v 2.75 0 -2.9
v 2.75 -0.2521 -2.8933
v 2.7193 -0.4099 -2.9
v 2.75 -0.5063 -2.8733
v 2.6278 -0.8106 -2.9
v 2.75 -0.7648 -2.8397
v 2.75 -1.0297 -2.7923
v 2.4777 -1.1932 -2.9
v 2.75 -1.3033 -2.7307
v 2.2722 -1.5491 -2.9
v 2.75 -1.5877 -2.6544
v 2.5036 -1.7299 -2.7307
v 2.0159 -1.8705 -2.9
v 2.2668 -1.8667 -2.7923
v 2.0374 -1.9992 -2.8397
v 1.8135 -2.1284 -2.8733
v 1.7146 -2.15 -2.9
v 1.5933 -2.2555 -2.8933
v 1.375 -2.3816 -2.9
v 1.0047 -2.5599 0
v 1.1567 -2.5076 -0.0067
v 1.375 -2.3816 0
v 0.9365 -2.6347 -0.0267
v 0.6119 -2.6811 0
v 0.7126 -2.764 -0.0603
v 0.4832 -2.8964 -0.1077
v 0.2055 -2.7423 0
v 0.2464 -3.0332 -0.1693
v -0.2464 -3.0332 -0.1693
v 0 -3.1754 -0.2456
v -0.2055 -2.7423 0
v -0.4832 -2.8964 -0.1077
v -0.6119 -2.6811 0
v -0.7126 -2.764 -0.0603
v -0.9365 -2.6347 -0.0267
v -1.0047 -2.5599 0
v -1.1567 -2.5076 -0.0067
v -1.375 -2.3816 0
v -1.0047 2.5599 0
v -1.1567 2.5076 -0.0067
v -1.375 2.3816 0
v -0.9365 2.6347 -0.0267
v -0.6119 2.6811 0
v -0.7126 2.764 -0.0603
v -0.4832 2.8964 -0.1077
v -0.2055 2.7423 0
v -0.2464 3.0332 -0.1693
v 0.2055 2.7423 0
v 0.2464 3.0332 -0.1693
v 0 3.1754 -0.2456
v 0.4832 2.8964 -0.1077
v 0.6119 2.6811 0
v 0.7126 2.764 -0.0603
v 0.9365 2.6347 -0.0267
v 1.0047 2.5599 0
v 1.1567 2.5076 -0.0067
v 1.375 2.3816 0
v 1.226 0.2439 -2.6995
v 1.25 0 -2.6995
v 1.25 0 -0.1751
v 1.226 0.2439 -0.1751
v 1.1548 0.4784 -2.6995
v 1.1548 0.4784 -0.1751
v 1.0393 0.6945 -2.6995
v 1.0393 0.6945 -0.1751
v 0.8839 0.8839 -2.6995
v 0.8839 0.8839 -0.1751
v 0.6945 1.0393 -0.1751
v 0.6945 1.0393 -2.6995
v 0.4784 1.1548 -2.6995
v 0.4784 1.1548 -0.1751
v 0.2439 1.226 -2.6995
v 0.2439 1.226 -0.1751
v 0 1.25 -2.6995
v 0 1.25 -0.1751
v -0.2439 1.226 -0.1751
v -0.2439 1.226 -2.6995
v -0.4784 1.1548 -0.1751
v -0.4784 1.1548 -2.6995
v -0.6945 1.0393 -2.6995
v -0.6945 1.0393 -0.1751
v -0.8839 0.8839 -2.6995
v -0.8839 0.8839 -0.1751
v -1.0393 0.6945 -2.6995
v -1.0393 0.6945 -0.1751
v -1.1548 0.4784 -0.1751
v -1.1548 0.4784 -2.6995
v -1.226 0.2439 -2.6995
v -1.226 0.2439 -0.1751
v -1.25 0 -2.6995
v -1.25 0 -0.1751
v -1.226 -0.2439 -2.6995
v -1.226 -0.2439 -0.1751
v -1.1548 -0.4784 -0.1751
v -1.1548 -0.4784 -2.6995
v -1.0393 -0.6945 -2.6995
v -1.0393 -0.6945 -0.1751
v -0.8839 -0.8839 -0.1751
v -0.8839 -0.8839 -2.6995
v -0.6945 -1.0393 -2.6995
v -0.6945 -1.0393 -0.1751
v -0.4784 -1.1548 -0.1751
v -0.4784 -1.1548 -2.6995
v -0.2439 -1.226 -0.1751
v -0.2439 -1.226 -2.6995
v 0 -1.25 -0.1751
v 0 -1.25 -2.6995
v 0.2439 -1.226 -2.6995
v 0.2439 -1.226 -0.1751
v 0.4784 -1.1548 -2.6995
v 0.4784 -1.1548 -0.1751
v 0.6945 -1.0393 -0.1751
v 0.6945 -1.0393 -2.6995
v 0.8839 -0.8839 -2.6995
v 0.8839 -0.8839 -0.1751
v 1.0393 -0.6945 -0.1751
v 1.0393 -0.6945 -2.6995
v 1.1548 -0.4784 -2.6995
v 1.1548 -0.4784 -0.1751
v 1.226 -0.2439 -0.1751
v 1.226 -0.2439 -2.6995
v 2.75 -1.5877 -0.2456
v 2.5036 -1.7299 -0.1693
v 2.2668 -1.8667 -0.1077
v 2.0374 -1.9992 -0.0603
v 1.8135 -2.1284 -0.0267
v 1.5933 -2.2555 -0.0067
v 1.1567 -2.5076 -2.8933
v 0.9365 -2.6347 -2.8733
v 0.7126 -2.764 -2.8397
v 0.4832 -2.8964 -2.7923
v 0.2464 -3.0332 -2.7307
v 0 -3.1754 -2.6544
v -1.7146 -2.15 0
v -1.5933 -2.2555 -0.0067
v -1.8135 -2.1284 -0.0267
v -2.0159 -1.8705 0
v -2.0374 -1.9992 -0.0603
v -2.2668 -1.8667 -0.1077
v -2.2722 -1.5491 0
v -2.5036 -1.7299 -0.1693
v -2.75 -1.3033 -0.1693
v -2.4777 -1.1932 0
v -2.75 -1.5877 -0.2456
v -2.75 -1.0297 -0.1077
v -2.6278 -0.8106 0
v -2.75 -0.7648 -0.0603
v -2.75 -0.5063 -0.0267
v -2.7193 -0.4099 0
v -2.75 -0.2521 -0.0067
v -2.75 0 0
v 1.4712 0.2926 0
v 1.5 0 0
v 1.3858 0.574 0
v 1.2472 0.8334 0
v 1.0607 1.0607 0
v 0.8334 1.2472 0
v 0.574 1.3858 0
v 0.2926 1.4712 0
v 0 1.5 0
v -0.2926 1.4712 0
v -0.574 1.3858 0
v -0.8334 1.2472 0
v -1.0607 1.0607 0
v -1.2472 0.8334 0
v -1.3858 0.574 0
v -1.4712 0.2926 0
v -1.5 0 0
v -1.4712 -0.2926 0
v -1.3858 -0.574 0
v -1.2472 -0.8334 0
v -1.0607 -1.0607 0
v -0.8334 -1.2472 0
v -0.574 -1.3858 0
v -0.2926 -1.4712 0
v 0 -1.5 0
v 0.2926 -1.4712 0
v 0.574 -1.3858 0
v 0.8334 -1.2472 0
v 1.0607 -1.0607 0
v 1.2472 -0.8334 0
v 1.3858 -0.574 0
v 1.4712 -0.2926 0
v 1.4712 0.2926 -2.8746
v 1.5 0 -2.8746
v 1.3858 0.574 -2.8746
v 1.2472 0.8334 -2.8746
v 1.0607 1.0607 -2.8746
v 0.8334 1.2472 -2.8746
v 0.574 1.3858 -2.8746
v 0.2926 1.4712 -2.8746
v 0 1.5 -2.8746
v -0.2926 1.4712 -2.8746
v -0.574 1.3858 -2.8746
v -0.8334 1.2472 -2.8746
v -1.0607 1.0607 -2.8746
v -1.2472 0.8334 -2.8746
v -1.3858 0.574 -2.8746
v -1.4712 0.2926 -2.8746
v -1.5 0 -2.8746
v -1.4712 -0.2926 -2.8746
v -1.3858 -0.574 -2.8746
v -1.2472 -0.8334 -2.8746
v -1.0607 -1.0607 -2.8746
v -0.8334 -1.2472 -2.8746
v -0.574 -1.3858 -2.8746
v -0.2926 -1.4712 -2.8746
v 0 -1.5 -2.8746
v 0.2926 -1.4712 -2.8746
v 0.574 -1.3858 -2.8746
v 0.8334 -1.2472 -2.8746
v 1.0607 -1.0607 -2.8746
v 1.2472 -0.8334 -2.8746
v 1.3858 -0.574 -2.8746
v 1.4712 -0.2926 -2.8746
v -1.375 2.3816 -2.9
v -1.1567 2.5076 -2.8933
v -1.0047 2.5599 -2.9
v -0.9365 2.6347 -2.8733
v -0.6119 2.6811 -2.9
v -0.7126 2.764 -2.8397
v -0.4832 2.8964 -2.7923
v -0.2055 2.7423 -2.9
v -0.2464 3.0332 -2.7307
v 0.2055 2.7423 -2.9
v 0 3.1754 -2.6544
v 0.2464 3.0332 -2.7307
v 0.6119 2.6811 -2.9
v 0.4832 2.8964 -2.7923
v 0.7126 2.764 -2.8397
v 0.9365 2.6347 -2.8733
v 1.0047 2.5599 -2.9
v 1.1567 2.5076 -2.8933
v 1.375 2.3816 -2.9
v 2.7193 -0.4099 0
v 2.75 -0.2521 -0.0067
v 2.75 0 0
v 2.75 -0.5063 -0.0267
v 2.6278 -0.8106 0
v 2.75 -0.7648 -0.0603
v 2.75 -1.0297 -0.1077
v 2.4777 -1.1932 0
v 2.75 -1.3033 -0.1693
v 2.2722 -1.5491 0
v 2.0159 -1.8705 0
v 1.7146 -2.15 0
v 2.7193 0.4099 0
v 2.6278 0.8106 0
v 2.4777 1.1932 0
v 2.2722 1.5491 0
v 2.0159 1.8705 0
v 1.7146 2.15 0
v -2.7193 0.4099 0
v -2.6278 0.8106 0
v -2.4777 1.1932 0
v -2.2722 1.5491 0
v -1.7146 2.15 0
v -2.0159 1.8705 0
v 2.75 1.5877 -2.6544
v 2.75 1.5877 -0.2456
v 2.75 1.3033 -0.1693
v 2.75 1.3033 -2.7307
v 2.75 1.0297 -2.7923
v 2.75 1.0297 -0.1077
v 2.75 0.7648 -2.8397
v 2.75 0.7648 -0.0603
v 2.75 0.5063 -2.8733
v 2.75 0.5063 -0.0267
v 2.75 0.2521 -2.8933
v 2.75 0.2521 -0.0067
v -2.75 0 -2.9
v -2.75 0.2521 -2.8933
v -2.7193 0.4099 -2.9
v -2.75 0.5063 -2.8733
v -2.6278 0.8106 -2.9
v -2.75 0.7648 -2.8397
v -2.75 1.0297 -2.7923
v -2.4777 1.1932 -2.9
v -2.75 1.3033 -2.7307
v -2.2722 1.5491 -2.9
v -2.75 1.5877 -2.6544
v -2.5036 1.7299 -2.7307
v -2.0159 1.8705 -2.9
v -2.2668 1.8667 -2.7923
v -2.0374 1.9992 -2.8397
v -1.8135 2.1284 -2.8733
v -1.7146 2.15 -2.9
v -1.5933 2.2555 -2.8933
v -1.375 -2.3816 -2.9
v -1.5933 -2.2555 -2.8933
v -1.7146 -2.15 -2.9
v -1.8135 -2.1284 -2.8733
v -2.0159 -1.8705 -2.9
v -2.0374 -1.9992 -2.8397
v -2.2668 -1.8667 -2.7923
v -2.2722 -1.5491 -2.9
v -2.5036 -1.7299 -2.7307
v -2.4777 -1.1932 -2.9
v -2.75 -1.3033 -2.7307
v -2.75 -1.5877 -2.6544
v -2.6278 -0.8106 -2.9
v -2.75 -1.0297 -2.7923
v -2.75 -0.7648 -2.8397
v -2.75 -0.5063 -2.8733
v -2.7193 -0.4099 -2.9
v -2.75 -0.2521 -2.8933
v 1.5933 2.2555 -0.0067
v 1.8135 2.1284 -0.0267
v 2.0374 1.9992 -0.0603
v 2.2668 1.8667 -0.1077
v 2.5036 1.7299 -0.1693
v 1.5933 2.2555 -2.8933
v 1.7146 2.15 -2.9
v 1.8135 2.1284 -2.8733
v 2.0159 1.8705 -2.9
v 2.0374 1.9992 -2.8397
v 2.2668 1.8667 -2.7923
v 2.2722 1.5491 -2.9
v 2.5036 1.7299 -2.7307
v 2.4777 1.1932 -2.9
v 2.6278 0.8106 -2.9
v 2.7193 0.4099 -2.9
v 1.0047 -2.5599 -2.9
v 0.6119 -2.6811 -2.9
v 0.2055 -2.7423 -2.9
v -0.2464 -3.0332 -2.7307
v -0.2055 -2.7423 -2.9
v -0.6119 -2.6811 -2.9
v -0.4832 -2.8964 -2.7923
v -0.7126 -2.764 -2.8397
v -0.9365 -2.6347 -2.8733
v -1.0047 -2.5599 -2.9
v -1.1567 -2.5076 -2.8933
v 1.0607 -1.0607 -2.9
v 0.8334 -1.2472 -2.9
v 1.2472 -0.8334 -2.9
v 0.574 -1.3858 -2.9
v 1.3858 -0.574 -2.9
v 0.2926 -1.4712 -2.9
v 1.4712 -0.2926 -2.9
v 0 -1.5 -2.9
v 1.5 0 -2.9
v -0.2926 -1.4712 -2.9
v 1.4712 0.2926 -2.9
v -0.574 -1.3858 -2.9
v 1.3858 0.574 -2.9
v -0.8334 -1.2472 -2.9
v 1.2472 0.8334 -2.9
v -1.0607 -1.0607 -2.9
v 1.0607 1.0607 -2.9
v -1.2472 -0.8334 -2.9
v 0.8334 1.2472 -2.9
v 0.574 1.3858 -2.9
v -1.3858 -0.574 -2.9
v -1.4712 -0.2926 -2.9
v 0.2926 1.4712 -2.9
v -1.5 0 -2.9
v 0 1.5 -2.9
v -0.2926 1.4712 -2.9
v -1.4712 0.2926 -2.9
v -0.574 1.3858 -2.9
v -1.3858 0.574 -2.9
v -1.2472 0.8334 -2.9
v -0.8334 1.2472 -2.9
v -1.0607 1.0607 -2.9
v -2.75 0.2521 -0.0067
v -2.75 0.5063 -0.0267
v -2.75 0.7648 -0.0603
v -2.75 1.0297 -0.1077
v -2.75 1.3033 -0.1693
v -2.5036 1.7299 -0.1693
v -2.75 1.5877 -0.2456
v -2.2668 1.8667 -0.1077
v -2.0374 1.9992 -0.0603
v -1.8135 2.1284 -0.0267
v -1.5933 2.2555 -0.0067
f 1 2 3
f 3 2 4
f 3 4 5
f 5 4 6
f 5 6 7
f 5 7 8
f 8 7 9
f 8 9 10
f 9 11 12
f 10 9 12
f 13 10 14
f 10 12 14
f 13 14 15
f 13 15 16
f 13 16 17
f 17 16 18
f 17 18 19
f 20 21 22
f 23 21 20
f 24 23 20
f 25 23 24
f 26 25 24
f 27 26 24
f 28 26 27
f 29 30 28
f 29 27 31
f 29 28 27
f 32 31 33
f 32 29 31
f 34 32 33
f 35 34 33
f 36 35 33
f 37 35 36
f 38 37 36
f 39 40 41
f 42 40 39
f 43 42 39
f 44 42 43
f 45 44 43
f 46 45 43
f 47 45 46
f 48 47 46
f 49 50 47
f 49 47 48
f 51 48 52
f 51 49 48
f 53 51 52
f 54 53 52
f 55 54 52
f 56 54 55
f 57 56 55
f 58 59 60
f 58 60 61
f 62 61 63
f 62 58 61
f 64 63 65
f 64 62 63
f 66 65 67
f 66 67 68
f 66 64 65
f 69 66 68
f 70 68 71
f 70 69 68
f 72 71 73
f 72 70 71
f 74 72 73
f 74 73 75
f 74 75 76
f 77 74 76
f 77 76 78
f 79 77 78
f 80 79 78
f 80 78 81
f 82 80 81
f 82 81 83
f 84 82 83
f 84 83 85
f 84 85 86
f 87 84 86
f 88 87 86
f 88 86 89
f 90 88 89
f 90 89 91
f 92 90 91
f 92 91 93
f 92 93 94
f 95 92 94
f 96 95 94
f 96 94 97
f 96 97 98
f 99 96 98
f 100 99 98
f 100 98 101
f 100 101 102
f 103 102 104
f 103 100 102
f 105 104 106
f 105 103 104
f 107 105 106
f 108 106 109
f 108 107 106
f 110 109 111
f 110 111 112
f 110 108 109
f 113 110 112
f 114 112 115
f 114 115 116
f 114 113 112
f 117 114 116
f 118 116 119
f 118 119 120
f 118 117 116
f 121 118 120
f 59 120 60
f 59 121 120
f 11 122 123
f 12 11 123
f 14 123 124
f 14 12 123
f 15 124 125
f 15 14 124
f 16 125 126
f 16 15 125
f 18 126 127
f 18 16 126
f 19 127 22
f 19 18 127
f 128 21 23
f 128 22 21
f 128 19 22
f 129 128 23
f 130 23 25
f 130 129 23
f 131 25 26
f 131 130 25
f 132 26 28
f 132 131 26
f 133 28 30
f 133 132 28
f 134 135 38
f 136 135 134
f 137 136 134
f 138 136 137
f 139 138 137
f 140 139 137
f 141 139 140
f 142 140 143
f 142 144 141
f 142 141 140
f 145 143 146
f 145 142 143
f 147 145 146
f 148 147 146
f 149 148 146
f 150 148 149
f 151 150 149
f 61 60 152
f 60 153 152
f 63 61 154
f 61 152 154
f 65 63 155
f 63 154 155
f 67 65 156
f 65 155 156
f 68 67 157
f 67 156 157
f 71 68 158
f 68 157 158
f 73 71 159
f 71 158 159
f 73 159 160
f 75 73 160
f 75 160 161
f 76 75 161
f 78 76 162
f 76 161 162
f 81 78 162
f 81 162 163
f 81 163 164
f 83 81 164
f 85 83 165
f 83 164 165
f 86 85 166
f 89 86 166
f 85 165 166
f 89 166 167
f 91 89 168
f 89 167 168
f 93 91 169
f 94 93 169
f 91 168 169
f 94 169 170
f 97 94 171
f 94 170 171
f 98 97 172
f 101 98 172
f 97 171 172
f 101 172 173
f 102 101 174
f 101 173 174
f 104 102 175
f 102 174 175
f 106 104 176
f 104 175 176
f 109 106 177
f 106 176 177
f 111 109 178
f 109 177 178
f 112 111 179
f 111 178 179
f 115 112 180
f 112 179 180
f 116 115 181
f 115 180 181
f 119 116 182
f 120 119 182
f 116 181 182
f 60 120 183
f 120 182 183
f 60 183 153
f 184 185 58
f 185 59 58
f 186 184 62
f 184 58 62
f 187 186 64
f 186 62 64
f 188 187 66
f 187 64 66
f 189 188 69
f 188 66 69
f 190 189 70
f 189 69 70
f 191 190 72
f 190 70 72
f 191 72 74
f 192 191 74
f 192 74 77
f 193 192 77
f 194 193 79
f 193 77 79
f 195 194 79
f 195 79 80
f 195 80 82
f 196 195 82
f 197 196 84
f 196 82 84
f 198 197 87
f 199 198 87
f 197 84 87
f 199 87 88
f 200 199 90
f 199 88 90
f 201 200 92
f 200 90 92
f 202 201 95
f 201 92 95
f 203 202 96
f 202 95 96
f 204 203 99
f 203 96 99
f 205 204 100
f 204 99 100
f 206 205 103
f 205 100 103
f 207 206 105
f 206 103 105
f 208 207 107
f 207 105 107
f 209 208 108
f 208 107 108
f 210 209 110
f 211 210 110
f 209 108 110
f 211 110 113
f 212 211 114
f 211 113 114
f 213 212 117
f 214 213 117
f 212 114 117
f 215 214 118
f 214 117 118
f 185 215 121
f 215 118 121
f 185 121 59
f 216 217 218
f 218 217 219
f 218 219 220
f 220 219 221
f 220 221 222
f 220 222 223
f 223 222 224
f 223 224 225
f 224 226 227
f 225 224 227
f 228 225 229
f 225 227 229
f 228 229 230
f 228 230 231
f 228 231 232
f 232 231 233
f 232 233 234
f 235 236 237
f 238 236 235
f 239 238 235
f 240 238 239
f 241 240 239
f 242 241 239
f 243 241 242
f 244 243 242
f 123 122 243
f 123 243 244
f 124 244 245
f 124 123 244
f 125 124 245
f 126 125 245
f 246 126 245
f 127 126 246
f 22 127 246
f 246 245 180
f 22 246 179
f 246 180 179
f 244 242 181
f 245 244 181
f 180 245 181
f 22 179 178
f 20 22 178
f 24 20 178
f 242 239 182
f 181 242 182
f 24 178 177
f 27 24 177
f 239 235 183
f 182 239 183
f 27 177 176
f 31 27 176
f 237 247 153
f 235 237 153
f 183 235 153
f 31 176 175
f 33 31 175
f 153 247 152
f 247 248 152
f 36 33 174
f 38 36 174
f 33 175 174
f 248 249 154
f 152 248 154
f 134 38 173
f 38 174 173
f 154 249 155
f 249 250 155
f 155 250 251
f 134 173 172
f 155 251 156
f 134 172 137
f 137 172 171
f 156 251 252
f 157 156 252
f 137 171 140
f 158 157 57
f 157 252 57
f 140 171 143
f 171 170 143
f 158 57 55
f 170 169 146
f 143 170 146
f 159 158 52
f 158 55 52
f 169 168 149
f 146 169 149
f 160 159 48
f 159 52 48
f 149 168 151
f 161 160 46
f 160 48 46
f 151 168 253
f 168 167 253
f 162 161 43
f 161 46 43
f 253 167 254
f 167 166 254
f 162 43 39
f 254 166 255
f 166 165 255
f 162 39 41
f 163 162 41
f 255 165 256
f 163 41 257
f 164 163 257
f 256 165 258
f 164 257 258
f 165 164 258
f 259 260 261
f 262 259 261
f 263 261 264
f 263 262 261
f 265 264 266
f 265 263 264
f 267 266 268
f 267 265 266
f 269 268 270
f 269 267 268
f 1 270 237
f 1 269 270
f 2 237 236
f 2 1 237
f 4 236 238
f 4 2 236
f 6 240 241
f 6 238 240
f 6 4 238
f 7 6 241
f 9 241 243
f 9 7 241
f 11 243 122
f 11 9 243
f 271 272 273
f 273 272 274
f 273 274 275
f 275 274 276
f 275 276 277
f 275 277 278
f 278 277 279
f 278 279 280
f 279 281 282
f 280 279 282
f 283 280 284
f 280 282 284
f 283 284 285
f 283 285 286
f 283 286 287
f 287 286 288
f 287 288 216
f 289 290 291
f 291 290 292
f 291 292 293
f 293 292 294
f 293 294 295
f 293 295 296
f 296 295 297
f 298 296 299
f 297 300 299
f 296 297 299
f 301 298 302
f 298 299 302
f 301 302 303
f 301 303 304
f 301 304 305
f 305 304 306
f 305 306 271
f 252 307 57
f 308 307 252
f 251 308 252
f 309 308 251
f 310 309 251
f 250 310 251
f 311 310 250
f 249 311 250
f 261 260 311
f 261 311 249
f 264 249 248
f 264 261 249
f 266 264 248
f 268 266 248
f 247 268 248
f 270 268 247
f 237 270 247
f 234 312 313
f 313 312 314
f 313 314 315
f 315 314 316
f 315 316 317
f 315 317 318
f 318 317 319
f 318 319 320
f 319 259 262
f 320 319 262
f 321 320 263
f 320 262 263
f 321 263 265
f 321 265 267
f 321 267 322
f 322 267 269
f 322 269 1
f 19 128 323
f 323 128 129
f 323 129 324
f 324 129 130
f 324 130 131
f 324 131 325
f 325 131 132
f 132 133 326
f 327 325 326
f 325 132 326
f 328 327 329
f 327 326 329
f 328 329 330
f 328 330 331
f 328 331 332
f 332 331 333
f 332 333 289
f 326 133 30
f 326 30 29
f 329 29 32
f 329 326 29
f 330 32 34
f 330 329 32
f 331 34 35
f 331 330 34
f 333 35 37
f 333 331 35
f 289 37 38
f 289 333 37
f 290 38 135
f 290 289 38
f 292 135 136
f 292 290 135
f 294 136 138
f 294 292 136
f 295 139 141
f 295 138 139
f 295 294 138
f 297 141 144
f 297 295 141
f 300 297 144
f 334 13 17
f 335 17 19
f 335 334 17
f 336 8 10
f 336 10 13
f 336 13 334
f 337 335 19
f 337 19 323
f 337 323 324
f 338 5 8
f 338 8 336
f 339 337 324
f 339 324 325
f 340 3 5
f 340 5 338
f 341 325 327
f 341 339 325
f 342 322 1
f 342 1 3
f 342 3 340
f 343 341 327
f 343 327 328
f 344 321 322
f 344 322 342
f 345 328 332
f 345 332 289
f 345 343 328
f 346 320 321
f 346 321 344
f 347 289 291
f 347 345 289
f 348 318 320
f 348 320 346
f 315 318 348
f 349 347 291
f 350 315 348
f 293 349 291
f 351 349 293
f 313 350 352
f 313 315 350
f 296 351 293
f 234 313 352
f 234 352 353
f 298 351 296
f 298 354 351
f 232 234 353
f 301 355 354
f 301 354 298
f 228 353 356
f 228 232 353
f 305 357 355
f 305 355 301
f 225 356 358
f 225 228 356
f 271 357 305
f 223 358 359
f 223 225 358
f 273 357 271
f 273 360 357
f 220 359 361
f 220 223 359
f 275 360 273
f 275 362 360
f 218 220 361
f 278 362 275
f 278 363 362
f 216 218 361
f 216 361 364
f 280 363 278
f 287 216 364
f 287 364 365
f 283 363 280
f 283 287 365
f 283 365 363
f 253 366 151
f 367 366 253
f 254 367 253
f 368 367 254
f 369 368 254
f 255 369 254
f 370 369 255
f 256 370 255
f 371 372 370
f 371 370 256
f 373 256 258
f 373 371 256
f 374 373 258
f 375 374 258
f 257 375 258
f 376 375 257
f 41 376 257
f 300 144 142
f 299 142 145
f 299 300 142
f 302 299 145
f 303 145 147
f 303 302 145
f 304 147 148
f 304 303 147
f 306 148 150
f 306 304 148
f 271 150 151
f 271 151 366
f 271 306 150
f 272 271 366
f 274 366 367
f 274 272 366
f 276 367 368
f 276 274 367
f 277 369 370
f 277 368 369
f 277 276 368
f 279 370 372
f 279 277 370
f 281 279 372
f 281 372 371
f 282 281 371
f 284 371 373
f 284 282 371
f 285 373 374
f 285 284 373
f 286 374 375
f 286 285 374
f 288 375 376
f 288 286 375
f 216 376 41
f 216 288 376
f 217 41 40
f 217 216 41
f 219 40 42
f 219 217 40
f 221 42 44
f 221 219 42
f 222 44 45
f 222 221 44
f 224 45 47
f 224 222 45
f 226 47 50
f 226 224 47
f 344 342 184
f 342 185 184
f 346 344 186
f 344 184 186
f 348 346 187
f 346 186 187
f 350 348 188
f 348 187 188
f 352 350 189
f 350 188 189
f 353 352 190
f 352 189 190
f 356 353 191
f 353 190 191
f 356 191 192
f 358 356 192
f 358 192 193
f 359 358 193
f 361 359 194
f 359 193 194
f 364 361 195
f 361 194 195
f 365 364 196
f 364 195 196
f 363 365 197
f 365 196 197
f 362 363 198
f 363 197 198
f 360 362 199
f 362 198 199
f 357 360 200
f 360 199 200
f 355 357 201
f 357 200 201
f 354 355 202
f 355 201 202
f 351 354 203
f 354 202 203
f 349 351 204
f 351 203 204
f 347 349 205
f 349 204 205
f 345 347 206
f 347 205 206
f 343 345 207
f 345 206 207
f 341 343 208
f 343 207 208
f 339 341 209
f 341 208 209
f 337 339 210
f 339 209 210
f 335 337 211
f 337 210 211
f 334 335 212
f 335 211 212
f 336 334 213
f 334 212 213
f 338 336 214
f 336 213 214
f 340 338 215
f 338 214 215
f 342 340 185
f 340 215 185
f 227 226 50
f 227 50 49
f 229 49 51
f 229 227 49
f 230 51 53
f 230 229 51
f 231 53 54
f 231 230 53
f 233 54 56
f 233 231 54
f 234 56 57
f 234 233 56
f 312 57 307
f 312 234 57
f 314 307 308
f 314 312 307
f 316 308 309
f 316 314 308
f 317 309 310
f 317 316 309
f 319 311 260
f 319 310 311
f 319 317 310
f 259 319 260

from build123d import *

# Parameters (mm, degrees)
BASENUT_START = -2.9
BASENUTSKE_R  = 1.25
BASENUT_DEPTH = 2.9


# Read off the part's stored shape, not the designer's step: ThreadSchematic
with BuildPart() as part:
    # BaseNutSke → BaseNut (new body)
    with BuildSketch(Plane.XY.offset(BASENUT_START)):
        Polygon((2.75, 1.58771324), (2.75, -1.58771324), (0, -3.175426481), (-2.75, -1.58771324), (-2.75, 1.58771324), (0, 3.175426481), align=None)
        Circle(BASENUTSKE_R, mode=Mode.SUBTRACT)
    extrude(amount=BASENUT_DEPTH)

    # Sketch5 (on Front Plane) → EndChamfer (revolve, cut)
    with BuildSketch(Plane.XY):
        Polygon((2.8746, 1.5), (2.682042927, 1.225), (2.9254, 1.225), (2.9254, 1.5), align=None)
    revolve(axis=Axis((2.9254, 1.225, 0), (-1, 0, 0)), mode=Mode.SUBTRACT)

    # Sketch3 → Double-Chamfer (revolve, cut)
    with BuildSketch(Plane(origin=(0, 0, 0), x_dir=(0, 0, -1), z_dir=(1, 0, 0))):
        Polygon((2.9, 2.75), (2.654379907, 3.175426481), (2.654379907, 13.175426481), (12.9, 13.175426481), (12.9, 2.75), align=None)
        Polygon((0.245620093, 13.175426481), (-10, 13.175426481), (-10, 2.75), (0, 2.75), (0.245620093, 3.175426481), align=None)
    revolve(axis=Axis((0, 0, 0), (0, 0, -1)), mode=Mode.SUBTRACT)

    # ThreadSchematic outline → ThreadSchematic (revolve, cut)
    with BuildSketch(Plane.XZ):
        Polygon((1.25, 0), (1.25, -0.175051885), (1.5, 0), align=None)
        Polygon((1.5, -2.8746), (1.25, -2.699548115), (1.25, -2.9), (1.5, -2.9), align=None)
    revolve(axis=Axis((0, 0, 0), (0, 0, 1)), mode=Mode.SUBTRACT)


solid = part.part
